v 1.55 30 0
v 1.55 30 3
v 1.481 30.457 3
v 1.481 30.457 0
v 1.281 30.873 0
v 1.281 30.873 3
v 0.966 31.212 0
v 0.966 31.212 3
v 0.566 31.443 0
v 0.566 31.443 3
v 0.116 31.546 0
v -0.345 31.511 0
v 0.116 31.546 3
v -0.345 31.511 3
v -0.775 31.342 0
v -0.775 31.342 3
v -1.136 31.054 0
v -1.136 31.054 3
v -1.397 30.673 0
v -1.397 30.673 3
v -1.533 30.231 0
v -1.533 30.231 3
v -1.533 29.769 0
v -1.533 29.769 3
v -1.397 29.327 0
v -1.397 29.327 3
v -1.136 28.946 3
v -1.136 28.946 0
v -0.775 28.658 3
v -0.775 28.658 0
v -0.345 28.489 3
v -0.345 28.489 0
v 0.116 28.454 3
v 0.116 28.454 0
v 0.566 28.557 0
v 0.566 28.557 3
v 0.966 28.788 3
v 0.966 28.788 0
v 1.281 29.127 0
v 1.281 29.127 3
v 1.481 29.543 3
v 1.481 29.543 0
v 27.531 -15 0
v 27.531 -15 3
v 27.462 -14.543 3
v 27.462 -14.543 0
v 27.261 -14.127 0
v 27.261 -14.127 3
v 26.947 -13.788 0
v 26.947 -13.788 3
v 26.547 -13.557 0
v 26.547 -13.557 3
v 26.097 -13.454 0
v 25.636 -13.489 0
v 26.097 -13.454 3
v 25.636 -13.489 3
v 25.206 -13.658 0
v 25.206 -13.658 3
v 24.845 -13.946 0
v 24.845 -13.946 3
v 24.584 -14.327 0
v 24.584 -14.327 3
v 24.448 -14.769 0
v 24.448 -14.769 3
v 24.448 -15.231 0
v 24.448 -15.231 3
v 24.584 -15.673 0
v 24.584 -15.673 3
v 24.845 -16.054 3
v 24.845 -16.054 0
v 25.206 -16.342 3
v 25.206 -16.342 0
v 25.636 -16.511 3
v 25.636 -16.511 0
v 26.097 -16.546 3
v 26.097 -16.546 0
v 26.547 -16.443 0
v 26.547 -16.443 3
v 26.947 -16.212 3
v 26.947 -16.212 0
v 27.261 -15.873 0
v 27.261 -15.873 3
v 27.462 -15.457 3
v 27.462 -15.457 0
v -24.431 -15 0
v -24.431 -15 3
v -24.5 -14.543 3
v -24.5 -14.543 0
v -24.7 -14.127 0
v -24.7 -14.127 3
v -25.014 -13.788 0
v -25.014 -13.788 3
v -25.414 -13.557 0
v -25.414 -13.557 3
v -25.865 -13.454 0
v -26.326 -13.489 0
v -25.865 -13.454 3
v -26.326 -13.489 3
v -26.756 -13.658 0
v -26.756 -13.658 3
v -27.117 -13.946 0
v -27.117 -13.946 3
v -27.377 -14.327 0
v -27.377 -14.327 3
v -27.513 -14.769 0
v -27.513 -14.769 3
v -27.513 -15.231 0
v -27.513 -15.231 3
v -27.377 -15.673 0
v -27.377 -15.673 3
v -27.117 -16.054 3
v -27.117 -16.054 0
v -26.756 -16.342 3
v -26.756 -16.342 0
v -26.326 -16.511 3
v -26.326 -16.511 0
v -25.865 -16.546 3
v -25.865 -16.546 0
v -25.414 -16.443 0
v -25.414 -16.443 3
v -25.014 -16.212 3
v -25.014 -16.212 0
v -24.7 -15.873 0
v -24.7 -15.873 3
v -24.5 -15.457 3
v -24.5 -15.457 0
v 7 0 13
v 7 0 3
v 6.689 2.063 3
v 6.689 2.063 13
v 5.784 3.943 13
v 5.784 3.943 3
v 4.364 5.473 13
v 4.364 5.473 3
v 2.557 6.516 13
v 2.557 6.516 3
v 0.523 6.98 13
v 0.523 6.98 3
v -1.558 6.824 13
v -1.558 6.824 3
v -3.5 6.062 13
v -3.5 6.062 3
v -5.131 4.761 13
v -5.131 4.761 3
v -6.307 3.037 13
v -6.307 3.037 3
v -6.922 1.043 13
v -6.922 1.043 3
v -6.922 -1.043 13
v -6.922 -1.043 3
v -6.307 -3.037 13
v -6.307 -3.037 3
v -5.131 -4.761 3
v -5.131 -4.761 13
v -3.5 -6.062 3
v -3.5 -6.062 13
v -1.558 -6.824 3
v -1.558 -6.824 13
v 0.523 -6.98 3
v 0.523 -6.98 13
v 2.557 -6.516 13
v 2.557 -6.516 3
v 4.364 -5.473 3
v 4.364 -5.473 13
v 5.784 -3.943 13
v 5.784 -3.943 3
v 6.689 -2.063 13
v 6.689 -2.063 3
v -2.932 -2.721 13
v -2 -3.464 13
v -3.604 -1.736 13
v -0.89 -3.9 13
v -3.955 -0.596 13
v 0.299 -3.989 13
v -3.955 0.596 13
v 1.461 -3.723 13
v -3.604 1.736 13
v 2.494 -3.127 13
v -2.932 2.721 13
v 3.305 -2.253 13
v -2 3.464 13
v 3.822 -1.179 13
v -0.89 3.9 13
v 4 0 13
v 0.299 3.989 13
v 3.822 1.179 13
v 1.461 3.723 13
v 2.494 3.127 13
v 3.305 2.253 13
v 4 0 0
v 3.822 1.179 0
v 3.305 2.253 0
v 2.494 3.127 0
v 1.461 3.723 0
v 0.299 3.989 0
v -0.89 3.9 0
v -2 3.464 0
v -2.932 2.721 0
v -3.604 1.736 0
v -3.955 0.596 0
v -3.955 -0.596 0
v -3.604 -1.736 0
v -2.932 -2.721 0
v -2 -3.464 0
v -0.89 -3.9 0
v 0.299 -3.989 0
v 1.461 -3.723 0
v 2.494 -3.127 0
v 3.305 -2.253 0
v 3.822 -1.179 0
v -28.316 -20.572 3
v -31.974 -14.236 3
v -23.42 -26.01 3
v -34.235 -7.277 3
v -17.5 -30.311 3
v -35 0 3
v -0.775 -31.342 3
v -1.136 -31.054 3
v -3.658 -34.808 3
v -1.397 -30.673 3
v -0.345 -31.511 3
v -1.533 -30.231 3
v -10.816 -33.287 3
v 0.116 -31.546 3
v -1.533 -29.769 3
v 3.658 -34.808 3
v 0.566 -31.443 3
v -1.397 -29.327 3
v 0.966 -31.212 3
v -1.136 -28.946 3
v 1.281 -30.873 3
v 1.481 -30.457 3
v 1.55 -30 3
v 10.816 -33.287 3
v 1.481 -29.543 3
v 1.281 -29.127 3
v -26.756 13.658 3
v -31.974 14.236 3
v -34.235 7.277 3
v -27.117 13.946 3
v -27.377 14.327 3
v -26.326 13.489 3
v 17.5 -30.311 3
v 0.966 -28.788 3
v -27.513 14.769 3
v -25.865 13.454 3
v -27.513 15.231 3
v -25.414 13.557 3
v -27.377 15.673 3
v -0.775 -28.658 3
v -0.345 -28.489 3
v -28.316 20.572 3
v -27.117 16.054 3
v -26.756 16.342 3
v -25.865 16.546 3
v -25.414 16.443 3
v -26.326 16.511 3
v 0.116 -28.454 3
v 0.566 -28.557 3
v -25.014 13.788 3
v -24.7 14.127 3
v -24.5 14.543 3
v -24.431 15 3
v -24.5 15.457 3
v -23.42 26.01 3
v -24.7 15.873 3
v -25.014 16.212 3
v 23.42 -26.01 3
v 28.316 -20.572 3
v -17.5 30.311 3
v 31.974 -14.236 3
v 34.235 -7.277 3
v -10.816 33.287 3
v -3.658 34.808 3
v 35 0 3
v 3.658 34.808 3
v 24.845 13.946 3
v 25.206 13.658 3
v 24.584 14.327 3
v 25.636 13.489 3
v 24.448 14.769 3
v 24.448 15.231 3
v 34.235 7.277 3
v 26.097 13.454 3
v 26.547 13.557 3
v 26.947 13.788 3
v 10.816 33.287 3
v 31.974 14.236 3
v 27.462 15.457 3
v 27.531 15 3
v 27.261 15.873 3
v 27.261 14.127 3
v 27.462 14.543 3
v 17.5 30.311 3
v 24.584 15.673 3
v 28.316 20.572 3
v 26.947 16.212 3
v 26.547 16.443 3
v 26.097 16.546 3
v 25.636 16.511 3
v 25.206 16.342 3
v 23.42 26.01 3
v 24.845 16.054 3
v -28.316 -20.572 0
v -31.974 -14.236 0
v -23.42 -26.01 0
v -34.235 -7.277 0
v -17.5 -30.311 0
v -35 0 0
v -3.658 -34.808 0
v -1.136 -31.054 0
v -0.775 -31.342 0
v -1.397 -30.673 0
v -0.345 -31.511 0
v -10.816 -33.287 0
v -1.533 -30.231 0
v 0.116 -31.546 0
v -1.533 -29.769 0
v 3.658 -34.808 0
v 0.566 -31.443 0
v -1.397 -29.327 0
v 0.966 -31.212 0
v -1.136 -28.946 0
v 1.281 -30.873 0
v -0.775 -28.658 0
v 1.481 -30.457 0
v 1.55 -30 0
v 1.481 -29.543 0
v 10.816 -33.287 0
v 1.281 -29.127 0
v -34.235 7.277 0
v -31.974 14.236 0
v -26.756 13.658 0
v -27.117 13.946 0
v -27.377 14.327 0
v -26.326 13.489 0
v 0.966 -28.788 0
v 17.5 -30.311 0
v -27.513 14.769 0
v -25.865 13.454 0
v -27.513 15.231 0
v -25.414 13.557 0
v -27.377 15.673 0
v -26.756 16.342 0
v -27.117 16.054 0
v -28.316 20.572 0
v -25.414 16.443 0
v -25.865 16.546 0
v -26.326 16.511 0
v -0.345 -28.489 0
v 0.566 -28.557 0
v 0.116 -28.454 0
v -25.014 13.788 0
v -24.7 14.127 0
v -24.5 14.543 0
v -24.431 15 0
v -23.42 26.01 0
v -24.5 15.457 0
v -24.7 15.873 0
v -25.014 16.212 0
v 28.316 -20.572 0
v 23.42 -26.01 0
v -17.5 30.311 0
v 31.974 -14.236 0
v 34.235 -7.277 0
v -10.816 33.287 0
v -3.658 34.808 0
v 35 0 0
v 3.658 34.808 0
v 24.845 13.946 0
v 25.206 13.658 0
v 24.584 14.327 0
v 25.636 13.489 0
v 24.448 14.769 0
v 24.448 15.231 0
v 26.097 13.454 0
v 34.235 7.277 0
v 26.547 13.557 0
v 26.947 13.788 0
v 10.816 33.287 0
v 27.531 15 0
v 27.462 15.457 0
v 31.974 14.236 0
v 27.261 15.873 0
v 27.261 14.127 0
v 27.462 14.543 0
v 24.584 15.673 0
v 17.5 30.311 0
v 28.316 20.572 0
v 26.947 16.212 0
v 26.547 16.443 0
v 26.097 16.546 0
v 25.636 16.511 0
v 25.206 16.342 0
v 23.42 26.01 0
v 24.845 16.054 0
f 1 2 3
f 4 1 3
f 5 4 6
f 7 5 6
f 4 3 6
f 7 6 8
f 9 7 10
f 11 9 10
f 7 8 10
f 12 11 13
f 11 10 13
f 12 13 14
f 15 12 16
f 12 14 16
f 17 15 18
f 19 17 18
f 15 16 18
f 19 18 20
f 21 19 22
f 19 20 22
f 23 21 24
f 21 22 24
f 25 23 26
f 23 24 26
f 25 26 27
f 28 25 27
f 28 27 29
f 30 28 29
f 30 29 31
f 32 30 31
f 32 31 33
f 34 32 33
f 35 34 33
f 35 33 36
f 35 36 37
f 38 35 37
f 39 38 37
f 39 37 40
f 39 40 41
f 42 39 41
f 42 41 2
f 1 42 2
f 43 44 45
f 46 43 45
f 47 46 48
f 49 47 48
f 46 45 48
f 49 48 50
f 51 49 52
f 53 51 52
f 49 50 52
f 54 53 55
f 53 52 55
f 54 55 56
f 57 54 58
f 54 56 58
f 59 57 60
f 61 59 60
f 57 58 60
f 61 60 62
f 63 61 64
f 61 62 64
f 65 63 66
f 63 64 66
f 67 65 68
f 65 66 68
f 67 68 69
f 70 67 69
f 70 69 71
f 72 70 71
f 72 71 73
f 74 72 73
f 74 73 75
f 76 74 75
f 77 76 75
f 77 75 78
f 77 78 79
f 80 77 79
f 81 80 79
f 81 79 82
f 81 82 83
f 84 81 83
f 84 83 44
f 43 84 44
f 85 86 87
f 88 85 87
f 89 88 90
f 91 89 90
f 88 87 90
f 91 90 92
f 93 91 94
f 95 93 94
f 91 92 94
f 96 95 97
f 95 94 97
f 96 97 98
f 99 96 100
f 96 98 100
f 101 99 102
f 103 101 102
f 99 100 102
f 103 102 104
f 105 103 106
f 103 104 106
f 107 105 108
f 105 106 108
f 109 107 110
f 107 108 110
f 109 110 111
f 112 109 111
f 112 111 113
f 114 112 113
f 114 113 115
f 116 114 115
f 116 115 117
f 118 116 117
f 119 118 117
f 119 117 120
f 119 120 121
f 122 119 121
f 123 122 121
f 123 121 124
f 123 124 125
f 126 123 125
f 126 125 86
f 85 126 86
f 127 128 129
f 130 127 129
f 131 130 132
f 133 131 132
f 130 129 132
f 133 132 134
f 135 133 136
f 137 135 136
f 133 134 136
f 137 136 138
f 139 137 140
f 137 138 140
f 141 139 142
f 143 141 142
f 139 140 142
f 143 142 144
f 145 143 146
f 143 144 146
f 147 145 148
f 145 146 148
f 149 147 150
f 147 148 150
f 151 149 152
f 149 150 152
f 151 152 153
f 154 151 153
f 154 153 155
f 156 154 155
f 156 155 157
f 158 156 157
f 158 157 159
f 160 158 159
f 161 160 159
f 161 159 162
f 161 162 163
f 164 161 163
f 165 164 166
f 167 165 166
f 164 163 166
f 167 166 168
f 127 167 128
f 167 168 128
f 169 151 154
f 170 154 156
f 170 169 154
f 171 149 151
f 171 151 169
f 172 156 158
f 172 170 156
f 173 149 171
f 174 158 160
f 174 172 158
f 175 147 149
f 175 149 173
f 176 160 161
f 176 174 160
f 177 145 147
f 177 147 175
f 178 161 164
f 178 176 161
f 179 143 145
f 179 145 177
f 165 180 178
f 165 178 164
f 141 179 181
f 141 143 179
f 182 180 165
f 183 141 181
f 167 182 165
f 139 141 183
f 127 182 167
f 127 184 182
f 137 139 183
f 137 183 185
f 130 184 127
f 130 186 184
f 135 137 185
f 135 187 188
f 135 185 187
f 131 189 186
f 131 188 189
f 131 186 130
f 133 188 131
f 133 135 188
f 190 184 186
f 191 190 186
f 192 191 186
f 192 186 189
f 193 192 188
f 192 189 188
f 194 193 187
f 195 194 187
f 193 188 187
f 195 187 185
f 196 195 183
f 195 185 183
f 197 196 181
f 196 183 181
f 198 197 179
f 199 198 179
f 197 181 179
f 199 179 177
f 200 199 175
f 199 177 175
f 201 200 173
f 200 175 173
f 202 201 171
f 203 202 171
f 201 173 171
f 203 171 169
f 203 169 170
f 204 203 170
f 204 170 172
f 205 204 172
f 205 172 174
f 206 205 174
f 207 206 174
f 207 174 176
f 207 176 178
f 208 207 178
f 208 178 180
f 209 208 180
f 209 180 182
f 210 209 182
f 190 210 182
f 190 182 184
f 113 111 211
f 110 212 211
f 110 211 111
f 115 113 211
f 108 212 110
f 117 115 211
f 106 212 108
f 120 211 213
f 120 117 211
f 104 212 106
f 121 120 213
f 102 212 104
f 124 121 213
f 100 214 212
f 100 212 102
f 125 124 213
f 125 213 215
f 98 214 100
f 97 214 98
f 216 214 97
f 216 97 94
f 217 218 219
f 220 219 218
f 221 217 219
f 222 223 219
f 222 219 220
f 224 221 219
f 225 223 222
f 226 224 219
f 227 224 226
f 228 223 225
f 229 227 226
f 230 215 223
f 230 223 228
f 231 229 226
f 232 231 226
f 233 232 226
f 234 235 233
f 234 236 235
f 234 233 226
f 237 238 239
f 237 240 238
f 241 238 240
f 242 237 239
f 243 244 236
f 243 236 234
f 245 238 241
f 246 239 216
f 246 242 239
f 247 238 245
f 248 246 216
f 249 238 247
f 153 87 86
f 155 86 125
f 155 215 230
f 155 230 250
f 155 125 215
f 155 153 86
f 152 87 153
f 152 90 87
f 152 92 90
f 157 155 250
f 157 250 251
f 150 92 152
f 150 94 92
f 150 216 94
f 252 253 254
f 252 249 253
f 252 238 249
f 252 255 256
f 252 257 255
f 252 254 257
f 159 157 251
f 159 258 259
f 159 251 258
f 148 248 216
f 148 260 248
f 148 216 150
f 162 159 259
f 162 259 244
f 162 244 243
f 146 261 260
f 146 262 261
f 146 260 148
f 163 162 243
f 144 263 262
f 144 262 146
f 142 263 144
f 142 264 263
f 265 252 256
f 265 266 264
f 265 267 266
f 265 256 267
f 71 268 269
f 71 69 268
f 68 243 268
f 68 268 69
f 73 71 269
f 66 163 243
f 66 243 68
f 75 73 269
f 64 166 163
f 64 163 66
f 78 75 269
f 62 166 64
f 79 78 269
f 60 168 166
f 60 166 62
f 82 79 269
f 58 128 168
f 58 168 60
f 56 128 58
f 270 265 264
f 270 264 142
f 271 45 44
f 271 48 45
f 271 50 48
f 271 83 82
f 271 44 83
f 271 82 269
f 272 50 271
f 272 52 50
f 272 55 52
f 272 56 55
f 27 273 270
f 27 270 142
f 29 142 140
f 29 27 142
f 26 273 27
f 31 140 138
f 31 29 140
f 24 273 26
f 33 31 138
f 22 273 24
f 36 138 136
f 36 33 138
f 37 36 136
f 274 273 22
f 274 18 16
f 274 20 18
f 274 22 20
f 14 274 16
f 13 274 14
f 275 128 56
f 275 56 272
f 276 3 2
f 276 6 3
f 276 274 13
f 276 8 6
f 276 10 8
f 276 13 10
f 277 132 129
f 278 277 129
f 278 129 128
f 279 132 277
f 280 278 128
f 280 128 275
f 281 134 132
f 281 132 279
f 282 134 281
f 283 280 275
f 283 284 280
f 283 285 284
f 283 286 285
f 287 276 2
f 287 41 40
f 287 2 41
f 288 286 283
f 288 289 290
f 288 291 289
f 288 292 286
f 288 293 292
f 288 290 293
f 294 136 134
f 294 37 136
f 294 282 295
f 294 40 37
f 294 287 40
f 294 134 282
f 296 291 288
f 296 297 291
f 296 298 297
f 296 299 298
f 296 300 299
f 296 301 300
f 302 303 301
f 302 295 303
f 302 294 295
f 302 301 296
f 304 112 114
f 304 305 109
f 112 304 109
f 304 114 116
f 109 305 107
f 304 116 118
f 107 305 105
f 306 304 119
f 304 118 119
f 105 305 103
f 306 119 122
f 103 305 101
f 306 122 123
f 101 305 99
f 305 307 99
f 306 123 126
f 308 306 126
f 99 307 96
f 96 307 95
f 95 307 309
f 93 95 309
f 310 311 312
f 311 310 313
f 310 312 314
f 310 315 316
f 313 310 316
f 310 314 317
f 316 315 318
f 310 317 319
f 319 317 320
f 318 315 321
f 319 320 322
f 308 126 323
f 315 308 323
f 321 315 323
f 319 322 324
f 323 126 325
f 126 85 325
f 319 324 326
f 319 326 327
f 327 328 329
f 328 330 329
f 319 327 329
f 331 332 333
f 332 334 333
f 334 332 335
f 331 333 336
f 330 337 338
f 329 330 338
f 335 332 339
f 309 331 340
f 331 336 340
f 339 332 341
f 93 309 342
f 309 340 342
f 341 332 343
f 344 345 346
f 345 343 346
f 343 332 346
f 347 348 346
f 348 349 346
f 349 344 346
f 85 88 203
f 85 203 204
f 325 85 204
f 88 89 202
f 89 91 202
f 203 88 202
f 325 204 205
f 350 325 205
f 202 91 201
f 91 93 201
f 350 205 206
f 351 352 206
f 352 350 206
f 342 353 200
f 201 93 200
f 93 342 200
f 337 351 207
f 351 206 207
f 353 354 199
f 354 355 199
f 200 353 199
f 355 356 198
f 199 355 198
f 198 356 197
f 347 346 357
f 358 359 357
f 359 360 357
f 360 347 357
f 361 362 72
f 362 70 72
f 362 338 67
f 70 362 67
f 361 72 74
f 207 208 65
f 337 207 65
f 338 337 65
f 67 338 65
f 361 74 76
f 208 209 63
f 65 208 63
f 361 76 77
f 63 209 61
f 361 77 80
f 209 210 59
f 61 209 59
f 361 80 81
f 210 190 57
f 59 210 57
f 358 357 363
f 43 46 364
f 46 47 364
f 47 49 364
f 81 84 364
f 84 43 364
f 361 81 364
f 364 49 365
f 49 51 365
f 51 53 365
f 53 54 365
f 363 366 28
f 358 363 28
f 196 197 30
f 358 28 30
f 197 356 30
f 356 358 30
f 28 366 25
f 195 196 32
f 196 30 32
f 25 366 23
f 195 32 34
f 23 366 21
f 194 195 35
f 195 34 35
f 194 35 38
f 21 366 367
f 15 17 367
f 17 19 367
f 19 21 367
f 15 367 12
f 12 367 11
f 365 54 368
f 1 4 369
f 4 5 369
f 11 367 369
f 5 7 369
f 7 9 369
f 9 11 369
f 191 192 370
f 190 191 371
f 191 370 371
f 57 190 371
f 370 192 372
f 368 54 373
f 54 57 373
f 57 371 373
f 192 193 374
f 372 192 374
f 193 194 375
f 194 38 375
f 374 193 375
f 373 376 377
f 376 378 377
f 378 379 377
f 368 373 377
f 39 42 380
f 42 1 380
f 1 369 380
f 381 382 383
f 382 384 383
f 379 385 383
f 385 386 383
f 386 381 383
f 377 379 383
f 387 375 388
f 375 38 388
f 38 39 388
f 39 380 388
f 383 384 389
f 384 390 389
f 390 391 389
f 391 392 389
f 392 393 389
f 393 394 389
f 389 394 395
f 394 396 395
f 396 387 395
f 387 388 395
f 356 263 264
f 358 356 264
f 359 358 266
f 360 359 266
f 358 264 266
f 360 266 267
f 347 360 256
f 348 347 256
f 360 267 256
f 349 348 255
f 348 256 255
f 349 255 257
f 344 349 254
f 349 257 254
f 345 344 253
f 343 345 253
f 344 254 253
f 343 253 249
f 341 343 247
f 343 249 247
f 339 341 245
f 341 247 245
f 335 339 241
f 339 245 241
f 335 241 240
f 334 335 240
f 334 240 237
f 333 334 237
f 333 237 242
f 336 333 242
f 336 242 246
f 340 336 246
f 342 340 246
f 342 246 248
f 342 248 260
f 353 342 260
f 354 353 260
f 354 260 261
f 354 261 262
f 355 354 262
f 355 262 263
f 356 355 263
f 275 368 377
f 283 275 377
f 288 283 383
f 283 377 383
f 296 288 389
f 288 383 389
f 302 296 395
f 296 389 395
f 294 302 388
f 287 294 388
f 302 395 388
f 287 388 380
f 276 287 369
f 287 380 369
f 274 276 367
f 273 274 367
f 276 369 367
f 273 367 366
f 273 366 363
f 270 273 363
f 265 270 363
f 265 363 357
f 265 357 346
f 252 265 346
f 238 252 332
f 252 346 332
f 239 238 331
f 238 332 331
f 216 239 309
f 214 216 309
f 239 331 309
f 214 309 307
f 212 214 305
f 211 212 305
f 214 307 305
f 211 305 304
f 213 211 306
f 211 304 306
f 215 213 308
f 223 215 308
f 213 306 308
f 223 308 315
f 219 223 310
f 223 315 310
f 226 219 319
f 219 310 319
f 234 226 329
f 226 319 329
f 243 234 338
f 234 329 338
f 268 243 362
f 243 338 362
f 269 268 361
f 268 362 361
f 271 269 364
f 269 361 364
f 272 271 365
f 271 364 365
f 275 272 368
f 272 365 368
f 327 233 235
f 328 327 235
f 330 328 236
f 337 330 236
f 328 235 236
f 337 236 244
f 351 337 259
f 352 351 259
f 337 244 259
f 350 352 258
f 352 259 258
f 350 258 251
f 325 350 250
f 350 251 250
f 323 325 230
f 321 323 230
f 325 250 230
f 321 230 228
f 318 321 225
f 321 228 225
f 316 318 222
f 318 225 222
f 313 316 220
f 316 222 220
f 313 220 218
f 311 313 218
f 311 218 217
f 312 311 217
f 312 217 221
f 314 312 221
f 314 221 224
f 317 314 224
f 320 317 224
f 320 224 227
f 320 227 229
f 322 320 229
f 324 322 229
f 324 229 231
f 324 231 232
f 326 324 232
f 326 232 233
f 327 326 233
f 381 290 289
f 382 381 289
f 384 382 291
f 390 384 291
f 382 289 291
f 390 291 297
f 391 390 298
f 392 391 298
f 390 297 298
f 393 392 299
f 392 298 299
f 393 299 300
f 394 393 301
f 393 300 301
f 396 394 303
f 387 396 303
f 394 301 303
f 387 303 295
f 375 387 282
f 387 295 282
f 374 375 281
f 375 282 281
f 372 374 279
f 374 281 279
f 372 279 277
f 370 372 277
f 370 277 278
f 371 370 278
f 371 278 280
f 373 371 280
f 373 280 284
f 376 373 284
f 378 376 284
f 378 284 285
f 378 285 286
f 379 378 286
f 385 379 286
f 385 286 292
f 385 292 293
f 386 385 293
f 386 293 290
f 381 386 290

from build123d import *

# Parameters (mm, degrees)
F0_R     = 35
F1_DEPTH = 3
F2_R     = 1.55
F3_DEPTH = 3.001
F4_R     = 7
F5_DEPTH = 10
F6_R     = 4
F7_DEPTH = 13.001


with BuildPart() as f1:
    # F0 (on Top) → F1 (new body)
    with BuildSketch(Plane.XY):
        Circle(F0_R)
    extrude(amount=F1_DEPTH)

    # F2 (on face) → F3 (cut, through all)
    with BuildSketch(Plane.XY.offset(3)):
        with Locations((0, 30)):
            Circle(F2_R)
        with Locations((-25.980762, 15)):
            Circle(F2_R)
        with Locations((-25.980762, -15)):
            Circle(F2_R)
        with Locations((25.980762, 15)):
            Circle(F2_R)
        with Locations((25.980762, -15)):
            Circle(F2_R)
        with Locations((0, -30)):
            Circle(F2_R)
    extrude(amount=-F3_DEPTH, mode=Mode.SUBTRACT)

    # F4 (on face) → F5 (join)
    with BuildSketch(Plane.XY.offset(3)):
        Circle(F4_R)
    extrude(amount=F5_DEPTH)

    # F6 (on face) → F7 (cut, through all)
    with BuildSketch(Plane.XY.offset(13)):
        Circle(F6_R)
    extrude(amount=-F7_DEPTH, mode=Mode.SUBTRACT)


solid = f1.part
